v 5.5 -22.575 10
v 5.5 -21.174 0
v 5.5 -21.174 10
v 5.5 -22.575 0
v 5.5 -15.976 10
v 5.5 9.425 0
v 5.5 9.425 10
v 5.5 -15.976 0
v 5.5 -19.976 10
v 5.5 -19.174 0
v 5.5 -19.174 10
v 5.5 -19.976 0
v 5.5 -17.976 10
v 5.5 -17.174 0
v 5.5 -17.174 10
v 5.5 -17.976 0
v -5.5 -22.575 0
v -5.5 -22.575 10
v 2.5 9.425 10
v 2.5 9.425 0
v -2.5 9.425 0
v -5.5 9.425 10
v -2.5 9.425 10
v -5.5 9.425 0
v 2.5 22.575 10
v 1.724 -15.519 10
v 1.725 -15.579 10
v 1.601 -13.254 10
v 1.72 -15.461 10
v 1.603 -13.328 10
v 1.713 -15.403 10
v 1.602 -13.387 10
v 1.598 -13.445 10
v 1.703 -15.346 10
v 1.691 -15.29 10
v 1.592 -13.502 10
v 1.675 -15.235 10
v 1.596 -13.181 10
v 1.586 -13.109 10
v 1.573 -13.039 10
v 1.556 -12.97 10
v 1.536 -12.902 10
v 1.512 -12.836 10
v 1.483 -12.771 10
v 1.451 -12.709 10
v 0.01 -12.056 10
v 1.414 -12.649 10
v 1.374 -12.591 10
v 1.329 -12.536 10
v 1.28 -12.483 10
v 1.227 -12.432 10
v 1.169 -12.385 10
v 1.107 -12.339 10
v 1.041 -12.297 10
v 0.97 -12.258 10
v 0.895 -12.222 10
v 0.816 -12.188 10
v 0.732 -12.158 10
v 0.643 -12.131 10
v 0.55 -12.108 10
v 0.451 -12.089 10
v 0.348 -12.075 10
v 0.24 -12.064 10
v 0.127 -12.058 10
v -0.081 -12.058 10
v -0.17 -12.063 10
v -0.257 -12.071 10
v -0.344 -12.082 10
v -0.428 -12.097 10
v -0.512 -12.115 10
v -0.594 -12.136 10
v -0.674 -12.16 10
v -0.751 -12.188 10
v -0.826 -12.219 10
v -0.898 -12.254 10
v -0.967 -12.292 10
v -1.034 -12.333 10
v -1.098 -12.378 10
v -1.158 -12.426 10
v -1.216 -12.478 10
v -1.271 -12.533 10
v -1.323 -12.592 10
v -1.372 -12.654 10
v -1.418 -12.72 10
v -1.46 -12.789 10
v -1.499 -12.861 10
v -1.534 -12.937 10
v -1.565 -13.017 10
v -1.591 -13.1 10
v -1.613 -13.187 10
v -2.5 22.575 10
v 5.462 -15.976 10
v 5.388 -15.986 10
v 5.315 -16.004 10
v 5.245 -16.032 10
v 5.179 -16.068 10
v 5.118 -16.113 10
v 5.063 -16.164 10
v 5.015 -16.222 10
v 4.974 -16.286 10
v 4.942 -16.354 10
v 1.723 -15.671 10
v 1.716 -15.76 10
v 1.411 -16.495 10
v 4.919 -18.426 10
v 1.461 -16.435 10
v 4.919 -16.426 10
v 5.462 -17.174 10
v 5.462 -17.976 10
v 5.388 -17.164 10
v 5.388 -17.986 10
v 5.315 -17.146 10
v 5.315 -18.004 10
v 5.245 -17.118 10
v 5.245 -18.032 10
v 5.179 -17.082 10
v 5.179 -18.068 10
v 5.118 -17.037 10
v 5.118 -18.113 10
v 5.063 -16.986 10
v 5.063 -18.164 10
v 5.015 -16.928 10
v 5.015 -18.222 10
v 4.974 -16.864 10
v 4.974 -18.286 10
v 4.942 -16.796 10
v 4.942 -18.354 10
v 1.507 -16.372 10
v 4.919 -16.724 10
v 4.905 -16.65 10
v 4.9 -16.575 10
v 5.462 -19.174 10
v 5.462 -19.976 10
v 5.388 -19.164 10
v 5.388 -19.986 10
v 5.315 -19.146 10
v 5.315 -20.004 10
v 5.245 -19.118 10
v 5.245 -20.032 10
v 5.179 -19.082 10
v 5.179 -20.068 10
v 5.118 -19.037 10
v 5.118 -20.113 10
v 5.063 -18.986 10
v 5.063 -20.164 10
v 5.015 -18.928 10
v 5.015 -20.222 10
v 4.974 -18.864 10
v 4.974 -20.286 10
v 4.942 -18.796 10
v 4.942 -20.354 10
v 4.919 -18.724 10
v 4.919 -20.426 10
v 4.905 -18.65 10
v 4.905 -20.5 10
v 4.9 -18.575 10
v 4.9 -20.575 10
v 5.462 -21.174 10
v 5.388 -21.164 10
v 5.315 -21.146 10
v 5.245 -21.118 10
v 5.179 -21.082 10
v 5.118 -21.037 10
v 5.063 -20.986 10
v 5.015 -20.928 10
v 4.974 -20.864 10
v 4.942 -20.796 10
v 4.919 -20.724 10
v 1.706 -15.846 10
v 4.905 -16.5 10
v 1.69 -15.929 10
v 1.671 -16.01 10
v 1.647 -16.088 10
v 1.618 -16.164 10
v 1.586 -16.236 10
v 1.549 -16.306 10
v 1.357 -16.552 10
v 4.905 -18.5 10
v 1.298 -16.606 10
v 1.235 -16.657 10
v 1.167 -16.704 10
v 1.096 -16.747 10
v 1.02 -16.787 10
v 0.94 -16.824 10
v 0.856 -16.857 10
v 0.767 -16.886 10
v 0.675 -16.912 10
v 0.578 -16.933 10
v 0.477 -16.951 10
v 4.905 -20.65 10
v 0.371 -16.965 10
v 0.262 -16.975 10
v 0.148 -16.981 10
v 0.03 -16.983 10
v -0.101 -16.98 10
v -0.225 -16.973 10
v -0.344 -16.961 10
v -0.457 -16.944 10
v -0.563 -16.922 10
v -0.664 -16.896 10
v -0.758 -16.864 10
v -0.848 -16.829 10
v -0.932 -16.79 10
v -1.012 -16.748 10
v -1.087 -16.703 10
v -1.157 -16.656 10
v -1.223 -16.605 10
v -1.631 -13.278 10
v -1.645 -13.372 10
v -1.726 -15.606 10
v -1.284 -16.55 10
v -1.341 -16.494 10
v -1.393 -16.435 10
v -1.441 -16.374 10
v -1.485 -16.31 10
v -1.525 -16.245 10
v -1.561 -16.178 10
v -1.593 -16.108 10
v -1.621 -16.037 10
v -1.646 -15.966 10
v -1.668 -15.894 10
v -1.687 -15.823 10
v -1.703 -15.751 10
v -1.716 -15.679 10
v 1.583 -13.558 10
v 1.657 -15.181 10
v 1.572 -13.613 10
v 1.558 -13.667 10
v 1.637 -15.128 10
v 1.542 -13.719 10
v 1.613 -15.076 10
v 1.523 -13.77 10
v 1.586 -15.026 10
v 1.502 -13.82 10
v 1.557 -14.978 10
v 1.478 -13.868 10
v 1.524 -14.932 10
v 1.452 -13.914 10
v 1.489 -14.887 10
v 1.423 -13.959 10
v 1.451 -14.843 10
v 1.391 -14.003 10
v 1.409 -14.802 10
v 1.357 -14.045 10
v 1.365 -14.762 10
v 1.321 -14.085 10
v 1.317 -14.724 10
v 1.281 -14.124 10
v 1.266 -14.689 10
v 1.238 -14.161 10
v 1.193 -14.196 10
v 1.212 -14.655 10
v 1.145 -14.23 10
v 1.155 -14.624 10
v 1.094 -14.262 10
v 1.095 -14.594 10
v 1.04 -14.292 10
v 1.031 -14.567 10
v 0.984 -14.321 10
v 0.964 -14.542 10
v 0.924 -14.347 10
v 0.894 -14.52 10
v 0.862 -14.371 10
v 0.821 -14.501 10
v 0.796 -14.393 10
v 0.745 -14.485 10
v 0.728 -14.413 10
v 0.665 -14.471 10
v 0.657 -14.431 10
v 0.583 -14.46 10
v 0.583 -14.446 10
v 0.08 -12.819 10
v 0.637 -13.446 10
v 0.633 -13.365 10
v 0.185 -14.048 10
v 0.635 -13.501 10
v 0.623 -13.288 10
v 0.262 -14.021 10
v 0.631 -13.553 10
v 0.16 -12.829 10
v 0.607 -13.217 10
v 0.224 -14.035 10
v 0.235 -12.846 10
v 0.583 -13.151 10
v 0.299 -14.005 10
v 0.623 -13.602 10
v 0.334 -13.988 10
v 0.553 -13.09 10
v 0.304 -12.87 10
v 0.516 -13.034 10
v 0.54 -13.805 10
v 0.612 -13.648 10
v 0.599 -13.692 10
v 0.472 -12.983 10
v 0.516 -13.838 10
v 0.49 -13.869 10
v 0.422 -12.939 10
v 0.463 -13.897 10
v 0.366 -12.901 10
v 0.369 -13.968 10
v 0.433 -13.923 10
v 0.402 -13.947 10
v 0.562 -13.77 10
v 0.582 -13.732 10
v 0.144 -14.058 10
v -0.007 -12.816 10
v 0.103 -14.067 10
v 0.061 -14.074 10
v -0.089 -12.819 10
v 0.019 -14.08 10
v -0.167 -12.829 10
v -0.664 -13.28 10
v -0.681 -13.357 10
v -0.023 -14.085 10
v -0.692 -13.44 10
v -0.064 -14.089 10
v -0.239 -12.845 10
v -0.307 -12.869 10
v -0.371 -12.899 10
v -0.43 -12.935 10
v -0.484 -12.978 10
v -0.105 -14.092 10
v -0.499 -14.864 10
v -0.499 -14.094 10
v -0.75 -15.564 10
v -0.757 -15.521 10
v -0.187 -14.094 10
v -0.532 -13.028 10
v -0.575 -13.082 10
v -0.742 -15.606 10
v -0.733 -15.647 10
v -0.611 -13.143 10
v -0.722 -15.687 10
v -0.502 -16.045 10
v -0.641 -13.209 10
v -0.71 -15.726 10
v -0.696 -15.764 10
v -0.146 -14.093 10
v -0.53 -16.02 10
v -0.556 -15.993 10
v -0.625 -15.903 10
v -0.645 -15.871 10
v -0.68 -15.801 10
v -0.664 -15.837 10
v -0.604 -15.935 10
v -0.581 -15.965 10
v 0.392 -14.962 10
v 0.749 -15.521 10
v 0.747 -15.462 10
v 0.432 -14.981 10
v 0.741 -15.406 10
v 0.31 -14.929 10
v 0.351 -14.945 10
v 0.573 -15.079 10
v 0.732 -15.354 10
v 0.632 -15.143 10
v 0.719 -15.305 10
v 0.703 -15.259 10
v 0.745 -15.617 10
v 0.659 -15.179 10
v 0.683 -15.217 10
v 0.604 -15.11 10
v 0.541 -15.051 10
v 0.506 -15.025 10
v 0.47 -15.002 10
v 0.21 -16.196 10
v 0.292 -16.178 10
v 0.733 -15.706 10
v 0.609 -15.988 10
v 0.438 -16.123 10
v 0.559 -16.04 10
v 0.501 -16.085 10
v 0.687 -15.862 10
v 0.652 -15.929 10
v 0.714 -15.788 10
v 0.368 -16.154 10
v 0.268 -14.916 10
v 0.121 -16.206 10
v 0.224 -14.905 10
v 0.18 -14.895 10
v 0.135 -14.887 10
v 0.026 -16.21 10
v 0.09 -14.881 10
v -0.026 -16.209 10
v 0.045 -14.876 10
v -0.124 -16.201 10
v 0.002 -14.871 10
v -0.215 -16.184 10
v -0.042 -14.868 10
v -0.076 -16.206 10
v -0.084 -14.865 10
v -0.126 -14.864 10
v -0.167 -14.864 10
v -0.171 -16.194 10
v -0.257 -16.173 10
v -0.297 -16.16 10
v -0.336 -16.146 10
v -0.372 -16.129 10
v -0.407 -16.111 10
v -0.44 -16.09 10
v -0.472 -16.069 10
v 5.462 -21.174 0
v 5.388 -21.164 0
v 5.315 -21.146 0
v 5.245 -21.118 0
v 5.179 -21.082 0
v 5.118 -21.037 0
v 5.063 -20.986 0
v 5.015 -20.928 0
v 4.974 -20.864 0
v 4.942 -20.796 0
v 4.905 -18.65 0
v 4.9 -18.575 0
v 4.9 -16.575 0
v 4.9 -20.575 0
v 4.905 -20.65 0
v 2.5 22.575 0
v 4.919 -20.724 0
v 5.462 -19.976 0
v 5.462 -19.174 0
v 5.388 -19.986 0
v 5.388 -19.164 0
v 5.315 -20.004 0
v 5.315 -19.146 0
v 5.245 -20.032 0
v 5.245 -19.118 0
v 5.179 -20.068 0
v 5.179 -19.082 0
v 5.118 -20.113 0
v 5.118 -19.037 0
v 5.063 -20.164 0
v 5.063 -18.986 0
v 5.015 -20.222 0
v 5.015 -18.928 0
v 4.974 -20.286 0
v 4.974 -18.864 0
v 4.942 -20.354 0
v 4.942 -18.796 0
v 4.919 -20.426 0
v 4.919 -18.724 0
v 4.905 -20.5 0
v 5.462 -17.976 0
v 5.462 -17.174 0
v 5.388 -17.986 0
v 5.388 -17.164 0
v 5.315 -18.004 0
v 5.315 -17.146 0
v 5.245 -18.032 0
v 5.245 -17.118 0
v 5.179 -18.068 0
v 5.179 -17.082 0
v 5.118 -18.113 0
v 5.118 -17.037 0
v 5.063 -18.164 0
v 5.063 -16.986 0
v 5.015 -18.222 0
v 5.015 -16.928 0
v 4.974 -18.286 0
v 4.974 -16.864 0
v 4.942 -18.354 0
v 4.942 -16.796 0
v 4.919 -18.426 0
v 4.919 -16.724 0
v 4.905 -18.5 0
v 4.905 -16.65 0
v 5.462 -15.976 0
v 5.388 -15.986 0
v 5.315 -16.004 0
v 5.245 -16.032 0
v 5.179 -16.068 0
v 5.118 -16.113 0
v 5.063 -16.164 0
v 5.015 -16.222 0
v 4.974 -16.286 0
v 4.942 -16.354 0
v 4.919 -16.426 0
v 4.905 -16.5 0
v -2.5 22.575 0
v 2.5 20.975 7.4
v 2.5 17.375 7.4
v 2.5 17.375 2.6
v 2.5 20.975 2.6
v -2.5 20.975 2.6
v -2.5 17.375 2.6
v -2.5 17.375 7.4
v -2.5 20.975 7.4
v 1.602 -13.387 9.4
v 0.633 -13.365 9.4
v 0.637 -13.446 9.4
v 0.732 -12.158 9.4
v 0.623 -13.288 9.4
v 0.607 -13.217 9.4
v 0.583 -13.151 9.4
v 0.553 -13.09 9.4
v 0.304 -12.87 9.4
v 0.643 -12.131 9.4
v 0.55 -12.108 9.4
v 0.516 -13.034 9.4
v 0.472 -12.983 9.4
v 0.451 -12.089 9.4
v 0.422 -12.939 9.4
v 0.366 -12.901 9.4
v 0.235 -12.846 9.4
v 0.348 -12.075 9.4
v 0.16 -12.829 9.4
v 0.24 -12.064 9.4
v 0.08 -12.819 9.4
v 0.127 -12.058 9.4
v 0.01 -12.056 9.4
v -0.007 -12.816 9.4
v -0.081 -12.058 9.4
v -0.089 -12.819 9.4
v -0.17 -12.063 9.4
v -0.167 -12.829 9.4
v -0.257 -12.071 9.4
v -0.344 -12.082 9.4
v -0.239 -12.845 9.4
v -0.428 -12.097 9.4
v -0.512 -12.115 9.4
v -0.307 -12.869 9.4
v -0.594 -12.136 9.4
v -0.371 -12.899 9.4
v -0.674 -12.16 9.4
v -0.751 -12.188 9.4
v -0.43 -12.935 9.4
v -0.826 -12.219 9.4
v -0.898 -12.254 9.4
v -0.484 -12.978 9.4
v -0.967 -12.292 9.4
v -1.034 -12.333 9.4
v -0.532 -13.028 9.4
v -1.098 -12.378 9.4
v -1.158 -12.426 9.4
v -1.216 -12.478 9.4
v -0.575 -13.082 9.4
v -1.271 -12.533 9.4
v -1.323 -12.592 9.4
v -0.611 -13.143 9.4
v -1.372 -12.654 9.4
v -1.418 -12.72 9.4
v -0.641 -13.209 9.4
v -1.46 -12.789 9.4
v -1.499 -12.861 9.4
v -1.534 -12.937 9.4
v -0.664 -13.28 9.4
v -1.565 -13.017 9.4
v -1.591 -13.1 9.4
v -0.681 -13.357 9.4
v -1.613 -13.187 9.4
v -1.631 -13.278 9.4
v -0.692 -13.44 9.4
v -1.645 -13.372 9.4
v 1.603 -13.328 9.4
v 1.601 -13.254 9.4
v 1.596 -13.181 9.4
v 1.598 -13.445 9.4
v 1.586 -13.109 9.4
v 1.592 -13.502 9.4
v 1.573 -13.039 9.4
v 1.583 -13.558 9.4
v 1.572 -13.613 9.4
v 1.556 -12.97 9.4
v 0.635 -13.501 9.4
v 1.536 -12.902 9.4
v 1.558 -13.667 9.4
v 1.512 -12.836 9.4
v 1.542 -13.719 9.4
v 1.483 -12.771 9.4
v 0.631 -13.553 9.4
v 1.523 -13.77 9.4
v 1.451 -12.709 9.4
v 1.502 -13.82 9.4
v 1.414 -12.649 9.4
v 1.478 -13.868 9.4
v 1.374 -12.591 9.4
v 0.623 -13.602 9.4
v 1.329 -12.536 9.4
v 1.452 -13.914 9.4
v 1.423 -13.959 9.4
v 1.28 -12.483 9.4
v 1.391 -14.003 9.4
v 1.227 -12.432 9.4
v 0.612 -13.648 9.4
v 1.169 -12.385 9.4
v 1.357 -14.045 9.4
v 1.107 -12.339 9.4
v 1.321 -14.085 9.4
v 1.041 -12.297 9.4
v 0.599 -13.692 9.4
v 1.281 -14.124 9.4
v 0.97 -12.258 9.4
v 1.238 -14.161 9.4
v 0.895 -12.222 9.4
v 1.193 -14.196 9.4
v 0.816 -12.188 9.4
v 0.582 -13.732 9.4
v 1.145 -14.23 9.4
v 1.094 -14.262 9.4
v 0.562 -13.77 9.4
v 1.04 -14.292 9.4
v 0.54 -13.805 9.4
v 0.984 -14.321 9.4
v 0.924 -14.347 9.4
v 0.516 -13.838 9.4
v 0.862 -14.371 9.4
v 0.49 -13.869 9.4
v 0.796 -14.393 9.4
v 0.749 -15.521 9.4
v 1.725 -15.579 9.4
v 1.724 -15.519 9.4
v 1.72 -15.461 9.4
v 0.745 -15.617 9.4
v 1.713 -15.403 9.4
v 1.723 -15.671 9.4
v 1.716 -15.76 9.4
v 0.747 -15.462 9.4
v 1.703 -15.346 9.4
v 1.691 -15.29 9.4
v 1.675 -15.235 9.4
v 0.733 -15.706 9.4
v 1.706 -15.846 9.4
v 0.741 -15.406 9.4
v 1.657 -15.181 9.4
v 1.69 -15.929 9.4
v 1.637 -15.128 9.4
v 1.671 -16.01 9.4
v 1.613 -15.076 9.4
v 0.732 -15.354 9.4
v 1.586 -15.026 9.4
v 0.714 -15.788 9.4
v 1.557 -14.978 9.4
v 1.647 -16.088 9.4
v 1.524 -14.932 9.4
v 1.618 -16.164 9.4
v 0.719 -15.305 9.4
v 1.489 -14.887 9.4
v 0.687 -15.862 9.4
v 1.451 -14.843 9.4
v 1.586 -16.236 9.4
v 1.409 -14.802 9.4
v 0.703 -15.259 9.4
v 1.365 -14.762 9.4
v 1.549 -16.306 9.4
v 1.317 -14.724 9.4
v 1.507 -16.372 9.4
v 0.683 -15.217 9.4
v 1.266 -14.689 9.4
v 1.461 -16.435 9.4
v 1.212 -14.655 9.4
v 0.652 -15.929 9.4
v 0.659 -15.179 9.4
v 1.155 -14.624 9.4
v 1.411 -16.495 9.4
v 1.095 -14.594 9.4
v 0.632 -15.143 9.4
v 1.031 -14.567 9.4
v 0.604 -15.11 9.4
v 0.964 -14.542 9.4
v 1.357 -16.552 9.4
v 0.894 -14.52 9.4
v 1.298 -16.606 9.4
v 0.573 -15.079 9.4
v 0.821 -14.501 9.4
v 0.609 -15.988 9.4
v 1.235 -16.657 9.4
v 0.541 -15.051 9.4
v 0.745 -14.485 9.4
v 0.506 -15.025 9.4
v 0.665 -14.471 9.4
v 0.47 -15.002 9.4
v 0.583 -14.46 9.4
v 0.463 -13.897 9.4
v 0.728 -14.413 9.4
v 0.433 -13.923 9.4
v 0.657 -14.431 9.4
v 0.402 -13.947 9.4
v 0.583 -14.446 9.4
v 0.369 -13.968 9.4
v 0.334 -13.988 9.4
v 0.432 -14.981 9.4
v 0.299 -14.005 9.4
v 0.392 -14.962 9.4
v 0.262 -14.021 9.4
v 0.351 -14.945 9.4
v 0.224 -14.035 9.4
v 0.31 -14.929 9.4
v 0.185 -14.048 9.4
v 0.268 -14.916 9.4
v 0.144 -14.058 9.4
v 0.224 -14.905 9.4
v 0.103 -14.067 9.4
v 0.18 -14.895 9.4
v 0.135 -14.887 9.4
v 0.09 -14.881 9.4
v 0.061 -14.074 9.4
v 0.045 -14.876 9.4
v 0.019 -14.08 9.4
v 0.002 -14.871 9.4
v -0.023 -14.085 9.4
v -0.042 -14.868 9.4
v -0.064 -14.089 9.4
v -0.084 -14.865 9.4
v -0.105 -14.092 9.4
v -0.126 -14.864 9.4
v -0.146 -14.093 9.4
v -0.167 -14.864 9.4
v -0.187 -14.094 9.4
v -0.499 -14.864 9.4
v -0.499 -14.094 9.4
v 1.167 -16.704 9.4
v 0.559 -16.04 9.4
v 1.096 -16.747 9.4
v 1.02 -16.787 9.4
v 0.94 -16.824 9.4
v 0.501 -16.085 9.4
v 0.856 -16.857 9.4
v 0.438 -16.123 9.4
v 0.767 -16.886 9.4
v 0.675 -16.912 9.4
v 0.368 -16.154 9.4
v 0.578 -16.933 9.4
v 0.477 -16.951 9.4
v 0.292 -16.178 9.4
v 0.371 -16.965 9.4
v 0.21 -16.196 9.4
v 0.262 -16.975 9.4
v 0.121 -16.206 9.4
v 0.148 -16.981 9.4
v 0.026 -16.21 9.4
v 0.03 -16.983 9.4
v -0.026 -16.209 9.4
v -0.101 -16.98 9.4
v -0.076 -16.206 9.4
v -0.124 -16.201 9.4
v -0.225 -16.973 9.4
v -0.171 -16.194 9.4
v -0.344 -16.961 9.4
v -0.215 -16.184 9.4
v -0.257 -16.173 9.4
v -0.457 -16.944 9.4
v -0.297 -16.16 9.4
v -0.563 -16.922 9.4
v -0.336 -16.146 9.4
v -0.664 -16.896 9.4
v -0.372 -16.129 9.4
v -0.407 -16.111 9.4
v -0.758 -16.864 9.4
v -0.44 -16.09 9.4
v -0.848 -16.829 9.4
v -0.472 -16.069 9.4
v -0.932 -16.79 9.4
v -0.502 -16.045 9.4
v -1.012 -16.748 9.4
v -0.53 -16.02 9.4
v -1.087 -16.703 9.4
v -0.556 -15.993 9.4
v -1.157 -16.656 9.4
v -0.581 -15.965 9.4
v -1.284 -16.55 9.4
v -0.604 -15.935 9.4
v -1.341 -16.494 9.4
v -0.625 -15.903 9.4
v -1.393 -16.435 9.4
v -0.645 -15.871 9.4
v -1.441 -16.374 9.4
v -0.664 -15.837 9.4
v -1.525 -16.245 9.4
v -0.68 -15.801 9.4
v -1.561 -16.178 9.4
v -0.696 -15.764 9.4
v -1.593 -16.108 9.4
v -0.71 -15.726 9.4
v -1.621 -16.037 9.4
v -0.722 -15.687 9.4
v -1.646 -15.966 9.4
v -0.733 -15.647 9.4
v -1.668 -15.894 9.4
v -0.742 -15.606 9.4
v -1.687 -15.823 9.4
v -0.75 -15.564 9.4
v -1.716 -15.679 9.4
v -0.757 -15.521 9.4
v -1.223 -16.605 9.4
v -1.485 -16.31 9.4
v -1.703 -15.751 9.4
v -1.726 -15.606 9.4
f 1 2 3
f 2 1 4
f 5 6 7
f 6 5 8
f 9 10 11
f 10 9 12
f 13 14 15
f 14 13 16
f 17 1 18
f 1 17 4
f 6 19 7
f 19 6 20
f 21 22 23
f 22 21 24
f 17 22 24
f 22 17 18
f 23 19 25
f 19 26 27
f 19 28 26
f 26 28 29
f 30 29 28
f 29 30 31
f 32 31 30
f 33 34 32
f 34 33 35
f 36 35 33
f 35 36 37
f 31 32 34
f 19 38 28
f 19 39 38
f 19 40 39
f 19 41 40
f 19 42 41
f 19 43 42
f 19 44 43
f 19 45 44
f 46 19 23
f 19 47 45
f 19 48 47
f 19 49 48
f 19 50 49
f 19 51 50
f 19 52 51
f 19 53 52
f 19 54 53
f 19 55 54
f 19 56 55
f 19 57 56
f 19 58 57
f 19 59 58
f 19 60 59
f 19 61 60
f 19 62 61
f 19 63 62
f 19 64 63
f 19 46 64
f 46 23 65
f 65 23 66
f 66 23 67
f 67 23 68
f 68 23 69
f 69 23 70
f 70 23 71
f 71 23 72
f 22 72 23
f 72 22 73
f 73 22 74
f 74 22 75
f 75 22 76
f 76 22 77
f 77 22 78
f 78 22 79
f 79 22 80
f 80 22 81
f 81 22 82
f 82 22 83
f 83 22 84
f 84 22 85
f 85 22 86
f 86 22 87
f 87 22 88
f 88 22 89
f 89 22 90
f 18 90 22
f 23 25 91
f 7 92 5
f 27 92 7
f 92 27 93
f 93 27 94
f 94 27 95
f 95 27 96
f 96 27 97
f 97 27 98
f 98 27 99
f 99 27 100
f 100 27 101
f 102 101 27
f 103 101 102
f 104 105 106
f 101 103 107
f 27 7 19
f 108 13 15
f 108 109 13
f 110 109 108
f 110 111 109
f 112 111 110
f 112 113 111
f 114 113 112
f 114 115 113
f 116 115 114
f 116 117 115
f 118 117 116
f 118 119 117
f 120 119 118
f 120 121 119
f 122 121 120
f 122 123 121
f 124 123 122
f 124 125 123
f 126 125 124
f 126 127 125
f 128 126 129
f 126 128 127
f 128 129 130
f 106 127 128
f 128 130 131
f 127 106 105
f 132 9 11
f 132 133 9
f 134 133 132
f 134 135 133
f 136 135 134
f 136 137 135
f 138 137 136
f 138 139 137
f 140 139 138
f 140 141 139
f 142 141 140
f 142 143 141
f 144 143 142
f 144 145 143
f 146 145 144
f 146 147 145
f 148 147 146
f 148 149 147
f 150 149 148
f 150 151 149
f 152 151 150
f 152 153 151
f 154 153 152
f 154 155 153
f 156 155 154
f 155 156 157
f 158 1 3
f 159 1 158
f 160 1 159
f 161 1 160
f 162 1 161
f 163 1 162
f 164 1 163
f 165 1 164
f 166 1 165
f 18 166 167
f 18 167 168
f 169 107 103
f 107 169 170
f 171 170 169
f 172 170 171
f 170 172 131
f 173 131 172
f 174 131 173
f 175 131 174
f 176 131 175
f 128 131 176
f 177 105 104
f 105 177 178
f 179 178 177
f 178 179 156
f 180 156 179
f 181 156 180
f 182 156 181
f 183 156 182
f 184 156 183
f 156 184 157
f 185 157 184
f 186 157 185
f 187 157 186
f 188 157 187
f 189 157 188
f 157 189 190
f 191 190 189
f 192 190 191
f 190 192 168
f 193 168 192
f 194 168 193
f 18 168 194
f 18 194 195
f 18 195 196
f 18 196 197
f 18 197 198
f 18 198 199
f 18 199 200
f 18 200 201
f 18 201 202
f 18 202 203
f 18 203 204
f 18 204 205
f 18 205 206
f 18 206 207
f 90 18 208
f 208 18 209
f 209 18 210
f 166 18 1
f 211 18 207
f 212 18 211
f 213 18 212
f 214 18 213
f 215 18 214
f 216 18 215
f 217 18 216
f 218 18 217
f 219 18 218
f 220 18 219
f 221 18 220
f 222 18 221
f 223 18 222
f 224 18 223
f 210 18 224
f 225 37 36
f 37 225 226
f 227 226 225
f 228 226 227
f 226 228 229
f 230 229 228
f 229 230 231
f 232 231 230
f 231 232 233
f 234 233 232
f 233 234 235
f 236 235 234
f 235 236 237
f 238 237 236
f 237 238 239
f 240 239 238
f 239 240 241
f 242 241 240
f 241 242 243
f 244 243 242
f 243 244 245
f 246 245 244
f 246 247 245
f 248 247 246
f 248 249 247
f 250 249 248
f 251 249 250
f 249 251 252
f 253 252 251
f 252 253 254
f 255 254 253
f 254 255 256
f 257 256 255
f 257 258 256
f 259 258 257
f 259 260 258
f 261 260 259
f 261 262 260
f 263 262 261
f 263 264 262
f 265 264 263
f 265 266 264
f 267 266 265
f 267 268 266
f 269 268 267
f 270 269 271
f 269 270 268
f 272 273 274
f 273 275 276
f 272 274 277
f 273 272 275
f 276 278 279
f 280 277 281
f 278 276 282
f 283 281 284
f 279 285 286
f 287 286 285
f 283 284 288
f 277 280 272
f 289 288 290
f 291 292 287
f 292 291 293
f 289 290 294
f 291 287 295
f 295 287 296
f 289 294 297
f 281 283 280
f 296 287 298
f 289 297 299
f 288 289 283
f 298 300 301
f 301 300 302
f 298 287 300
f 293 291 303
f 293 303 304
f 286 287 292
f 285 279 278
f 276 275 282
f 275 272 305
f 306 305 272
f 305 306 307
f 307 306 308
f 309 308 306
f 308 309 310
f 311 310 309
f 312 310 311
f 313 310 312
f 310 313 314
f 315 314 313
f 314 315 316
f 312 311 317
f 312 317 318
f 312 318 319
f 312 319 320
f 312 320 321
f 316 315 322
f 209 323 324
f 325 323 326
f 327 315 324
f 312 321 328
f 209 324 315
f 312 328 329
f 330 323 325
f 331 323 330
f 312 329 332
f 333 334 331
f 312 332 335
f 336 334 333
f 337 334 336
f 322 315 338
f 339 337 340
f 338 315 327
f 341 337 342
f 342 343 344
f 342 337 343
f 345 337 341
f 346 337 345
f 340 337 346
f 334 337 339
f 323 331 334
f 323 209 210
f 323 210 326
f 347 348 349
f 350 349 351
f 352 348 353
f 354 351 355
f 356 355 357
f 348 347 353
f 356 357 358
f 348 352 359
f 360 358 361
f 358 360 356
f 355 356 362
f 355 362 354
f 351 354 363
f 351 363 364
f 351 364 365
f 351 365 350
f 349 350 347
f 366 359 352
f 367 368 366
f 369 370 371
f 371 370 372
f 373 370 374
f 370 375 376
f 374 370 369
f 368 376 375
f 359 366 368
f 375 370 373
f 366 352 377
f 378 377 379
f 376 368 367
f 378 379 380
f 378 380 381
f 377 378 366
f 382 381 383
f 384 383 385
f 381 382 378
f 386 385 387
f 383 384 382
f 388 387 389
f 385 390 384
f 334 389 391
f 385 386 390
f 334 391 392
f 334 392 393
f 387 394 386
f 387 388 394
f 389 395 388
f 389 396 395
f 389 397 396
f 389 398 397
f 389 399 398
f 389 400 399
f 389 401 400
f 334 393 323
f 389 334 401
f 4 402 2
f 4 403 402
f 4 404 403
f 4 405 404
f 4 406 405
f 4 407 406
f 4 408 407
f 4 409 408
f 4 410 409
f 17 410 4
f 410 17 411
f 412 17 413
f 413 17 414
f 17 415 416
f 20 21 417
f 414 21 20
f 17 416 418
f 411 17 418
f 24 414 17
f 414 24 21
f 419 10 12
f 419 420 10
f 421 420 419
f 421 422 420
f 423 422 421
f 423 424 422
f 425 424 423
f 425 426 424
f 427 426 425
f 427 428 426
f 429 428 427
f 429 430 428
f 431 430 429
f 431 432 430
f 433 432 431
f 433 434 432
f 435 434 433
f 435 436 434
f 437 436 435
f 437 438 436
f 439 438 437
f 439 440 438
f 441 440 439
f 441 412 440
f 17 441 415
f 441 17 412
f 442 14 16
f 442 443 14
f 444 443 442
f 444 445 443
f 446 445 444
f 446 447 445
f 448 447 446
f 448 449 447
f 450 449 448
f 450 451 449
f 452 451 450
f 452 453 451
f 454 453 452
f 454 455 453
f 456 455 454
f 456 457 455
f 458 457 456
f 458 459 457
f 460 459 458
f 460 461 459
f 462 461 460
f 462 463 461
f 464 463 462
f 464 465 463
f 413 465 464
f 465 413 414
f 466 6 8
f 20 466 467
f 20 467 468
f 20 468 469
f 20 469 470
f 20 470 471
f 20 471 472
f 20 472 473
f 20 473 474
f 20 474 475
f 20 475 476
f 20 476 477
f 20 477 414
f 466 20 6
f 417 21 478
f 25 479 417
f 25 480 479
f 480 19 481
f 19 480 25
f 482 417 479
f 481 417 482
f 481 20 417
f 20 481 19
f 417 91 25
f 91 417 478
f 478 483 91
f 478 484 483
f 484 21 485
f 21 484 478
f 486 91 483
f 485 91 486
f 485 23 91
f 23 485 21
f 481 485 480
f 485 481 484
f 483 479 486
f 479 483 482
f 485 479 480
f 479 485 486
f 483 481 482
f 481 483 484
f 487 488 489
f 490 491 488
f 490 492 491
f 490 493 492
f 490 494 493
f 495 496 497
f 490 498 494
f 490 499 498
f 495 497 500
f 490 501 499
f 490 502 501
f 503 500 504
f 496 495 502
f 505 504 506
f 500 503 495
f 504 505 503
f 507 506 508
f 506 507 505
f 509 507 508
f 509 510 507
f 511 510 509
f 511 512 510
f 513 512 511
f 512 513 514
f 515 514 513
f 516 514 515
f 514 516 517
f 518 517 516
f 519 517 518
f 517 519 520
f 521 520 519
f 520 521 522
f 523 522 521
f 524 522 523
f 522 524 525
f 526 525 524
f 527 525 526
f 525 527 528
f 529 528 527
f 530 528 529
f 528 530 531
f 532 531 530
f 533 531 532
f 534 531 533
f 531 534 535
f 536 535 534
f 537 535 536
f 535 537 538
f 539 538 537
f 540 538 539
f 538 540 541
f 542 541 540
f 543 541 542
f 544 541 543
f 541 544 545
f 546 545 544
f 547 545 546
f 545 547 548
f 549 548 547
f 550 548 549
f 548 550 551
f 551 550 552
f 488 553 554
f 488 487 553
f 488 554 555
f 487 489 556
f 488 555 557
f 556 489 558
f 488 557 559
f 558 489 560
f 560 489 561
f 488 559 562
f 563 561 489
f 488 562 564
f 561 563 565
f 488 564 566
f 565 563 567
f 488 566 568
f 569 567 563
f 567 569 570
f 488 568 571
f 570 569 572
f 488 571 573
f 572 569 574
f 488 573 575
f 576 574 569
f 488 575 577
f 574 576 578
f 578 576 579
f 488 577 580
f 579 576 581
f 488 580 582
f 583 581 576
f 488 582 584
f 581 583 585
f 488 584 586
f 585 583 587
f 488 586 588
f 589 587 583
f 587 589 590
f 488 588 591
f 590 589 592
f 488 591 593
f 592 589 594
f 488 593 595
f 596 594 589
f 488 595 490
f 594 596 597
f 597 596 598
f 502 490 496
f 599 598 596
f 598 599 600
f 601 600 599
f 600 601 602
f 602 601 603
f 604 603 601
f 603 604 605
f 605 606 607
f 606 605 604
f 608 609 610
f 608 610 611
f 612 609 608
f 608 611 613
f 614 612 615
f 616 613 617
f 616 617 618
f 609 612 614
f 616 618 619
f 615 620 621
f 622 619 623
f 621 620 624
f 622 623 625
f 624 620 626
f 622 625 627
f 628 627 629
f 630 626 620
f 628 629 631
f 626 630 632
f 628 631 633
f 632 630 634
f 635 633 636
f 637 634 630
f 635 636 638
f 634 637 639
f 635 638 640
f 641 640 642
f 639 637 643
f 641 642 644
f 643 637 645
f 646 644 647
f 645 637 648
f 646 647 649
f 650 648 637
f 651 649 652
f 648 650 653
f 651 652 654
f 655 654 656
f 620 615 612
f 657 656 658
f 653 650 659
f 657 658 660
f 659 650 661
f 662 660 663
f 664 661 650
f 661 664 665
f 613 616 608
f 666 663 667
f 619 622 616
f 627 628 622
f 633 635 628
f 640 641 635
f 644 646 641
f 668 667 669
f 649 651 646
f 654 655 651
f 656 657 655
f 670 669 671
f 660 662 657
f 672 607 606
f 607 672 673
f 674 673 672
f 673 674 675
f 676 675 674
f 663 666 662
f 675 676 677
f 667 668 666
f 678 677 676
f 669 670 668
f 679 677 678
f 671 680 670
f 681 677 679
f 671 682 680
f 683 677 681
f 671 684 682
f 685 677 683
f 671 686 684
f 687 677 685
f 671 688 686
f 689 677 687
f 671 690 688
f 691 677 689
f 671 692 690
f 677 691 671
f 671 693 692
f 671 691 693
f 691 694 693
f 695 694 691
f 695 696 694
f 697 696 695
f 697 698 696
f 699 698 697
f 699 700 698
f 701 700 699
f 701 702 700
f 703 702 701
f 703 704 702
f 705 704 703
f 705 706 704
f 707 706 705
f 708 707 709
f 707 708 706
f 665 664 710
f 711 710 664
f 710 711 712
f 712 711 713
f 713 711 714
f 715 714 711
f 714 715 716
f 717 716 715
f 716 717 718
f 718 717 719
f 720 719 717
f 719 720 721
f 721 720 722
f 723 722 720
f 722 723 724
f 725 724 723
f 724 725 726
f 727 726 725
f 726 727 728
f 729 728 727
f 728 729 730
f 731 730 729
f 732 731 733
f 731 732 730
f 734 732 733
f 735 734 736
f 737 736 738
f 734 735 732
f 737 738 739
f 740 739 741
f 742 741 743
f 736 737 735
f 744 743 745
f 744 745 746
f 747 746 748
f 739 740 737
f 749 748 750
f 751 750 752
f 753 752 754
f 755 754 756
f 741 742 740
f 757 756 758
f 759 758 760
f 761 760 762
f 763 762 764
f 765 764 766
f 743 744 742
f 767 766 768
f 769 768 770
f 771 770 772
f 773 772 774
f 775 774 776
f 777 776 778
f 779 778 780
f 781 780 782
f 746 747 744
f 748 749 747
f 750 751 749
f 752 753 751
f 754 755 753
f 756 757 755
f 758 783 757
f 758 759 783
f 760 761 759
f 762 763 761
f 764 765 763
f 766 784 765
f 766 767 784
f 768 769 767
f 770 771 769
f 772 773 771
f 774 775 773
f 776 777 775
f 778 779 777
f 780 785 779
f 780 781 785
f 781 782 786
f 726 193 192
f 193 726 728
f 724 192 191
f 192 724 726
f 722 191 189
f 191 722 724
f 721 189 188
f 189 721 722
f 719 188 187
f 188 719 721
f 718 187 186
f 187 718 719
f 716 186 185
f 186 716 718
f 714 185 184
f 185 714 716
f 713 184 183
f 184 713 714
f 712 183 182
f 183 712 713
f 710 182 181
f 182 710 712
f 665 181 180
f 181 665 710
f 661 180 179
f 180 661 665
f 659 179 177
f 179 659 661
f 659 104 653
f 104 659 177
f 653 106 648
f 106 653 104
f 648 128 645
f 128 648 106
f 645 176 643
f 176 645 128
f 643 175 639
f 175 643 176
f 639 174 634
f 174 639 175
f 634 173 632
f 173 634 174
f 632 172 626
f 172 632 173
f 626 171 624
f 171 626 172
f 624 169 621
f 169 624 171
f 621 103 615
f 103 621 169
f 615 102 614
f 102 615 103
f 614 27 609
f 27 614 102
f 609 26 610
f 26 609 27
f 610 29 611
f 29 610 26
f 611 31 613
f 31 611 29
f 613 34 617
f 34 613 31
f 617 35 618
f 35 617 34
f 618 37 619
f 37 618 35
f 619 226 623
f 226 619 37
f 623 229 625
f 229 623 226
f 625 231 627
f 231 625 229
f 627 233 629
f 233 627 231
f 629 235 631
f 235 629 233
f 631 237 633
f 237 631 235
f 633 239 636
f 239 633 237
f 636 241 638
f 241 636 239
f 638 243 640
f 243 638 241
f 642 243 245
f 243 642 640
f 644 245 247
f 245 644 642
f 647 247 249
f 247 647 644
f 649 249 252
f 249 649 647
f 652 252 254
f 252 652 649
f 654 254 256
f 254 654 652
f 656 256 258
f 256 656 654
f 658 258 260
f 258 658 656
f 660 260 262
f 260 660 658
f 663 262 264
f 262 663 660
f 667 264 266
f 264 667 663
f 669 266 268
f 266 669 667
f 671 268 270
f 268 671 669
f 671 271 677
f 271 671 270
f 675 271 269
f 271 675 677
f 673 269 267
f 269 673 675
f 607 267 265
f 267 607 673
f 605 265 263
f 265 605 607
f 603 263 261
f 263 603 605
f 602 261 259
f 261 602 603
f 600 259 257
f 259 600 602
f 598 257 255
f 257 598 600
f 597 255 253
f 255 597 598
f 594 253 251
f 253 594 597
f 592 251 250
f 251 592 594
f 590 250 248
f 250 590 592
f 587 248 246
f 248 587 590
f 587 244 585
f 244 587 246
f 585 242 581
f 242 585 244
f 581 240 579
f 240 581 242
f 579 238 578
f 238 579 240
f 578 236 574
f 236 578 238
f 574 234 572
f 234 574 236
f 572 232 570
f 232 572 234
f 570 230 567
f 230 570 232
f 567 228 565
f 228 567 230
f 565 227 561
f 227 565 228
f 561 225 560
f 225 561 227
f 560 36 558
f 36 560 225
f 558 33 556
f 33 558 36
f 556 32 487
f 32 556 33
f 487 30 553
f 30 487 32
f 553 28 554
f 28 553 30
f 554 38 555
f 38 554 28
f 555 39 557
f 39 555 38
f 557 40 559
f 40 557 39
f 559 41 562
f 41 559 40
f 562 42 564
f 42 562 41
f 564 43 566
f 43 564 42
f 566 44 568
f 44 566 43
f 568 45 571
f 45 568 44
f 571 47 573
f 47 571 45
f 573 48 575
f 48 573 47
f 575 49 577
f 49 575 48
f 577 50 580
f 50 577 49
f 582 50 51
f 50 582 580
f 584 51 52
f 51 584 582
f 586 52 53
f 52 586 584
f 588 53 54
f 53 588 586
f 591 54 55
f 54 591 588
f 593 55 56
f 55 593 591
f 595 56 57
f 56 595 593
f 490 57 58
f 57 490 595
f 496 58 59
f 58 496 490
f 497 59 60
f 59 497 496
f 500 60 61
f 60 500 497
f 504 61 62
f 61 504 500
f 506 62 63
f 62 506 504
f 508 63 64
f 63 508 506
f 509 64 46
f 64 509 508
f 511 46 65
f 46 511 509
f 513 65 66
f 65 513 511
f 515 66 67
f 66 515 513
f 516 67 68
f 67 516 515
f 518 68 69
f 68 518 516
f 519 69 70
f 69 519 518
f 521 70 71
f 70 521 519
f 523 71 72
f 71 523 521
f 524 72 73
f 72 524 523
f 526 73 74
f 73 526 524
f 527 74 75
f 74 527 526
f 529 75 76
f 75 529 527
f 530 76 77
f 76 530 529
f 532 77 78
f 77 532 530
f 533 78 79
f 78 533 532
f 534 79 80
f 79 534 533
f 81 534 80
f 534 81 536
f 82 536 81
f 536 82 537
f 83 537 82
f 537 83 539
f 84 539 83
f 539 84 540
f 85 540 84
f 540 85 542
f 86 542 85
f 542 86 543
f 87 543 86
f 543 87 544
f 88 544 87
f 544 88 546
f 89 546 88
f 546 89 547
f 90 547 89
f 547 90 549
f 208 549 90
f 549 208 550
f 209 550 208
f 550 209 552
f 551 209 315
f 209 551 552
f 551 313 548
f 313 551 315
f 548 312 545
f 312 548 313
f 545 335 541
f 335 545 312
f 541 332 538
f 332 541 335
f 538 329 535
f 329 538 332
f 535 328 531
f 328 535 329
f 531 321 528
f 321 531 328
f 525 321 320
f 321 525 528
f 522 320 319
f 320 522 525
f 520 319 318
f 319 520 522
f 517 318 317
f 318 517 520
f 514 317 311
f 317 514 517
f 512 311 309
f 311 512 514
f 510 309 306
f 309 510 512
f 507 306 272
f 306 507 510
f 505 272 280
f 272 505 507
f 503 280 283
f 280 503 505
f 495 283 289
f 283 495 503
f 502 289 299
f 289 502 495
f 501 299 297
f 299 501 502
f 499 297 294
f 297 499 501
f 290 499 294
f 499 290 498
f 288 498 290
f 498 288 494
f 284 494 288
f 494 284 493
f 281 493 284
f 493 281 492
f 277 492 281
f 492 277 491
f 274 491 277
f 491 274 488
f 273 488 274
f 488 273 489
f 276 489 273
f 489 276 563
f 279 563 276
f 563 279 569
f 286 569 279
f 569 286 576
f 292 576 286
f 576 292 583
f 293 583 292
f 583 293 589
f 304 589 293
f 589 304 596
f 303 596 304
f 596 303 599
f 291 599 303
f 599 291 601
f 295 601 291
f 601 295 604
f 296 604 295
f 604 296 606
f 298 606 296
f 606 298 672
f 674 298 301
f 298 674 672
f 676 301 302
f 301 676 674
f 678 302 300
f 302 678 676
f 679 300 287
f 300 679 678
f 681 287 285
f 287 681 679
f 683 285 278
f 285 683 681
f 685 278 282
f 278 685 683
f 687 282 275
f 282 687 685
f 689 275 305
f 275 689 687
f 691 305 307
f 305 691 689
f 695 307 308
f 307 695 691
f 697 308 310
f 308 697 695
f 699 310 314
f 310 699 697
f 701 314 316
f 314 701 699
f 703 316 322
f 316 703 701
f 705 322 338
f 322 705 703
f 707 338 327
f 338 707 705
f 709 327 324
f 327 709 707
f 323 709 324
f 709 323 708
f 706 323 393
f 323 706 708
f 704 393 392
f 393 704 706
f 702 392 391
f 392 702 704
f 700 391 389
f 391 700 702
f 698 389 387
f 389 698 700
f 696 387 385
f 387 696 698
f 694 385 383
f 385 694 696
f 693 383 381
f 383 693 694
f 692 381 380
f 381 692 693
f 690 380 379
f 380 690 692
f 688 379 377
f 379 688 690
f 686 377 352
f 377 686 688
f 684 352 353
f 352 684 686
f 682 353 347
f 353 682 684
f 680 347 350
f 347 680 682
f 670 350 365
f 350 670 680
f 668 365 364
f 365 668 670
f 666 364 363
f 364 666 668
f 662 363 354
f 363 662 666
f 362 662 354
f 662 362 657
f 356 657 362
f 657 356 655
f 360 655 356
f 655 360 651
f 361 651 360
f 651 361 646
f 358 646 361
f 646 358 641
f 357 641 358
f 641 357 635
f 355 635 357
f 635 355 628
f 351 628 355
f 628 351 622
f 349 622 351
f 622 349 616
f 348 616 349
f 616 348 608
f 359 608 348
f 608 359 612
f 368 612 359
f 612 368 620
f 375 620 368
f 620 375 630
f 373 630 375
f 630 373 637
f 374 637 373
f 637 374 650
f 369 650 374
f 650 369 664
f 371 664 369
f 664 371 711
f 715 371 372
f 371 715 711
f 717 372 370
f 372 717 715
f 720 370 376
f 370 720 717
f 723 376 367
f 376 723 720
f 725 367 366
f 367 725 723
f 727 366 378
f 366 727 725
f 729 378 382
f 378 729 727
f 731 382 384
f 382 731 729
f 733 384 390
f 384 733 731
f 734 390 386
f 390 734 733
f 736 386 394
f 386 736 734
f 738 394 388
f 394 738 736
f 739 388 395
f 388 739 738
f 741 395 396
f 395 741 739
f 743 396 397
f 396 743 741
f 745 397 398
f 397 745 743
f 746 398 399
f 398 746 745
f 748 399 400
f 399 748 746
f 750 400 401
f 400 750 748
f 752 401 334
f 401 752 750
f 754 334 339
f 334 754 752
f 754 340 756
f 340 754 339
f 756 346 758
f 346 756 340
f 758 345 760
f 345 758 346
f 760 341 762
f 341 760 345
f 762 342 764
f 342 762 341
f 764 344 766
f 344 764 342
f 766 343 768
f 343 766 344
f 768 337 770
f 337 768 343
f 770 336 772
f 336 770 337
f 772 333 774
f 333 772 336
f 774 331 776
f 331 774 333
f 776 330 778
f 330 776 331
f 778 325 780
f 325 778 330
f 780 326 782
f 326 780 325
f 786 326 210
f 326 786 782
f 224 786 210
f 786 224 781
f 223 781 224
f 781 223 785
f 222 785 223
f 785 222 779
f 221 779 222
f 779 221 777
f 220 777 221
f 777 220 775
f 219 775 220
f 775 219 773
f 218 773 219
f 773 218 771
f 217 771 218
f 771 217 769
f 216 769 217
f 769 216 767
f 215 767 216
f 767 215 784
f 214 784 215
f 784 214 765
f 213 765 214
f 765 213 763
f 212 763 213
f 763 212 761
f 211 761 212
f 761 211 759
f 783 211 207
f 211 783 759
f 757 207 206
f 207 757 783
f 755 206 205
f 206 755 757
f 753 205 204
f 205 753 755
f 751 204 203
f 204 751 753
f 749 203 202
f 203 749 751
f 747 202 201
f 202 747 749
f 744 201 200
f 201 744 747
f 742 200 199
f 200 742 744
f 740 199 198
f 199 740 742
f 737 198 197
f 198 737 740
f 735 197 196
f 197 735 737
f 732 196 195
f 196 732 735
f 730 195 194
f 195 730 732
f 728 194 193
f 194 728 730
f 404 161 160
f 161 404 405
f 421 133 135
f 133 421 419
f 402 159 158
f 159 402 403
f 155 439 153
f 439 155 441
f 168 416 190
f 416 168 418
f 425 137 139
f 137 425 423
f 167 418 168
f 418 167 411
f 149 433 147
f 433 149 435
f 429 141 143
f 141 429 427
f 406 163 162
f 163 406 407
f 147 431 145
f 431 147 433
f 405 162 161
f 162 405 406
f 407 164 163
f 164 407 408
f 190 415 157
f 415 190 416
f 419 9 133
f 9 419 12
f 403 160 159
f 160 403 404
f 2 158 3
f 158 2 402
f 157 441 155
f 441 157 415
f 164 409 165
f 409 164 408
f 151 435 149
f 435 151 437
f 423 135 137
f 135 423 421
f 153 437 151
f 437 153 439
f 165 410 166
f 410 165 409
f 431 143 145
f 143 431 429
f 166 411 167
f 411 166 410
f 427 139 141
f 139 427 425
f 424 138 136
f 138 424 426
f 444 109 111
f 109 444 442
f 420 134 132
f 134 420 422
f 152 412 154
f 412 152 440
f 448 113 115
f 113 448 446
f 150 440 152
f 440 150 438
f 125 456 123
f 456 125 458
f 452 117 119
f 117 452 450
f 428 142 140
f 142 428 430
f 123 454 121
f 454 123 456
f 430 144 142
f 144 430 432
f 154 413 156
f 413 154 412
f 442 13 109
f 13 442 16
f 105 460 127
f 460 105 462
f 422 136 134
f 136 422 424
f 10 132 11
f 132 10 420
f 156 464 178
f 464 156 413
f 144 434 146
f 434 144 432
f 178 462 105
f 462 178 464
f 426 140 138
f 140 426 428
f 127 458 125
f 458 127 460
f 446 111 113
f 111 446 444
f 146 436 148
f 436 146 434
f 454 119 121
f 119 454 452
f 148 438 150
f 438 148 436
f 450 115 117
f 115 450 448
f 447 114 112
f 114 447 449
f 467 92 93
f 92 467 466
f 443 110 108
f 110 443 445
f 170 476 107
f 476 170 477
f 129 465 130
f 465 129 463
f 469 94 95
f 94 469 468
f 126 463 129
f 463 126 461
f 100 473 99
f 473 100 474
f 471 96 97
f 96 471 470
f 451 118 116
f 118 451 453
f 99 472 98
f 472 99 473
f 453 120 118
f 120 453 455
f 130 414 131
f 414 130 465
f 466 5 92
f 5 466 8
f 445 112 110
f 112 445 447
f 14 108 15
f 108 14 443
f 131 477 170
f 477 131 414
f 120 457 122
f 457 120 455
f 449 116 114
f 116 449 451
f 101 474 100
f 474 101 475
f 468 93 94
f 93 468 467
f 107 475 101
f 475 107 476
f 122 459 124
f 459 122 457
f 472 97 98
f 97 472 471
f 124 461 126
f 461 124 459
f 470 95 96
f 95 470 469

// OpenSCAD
$fn = 50;

difference() {
	union() {
		translate(v = [0, 9.425, 0]) {
			rotate(a = [90, 0, 0]) {
				difference() {
					union() {
						translate(v = [-5.5, 0, 0]) {
							cube(size = [11.0, 10.0, 32.0]);
						}
						translate(v = [-2.5, 0, -13.15]) {
							cube(size = [5.0, 10.0, 13.25]);
						}
					}
					union() {
						translate(v = [-2.6, 2.6, -11.55]) {
							cube(size = [5.2, 4.8, 3.5999999999999996]);
						}
						translate(v = [0, 9.4, 24.0]) {
							rotate(a = [-90, 0, 0]) {
								linear_extrude(height = 0.7) {
									text(font = "Arial:style=Bold", halign = "center", size = 5.0, text = "3", valign = "center");
								}
							}
						}
						translate(v = [5.5, 10.1, 30.0]) {
							rotate(a = [90, 0, 0]) {
								cylinder(h = 10.2, r = 0.6);
							}
						}
						translate(v = [5.5, 10.1, 28.0]) {
							rotate(a = [90, 0, 0]) {
								cylinder(h = 10.2, r = 0.6);
							}
						}
						translate(v = [5.5, 10.1, 26.0]) {
							rotate(a = [90, 0, 0]) {
								cylinder(h = 10.2, r = 0.6);
							}
						}
					}
				}
			}
		}
	}
	union();
}
